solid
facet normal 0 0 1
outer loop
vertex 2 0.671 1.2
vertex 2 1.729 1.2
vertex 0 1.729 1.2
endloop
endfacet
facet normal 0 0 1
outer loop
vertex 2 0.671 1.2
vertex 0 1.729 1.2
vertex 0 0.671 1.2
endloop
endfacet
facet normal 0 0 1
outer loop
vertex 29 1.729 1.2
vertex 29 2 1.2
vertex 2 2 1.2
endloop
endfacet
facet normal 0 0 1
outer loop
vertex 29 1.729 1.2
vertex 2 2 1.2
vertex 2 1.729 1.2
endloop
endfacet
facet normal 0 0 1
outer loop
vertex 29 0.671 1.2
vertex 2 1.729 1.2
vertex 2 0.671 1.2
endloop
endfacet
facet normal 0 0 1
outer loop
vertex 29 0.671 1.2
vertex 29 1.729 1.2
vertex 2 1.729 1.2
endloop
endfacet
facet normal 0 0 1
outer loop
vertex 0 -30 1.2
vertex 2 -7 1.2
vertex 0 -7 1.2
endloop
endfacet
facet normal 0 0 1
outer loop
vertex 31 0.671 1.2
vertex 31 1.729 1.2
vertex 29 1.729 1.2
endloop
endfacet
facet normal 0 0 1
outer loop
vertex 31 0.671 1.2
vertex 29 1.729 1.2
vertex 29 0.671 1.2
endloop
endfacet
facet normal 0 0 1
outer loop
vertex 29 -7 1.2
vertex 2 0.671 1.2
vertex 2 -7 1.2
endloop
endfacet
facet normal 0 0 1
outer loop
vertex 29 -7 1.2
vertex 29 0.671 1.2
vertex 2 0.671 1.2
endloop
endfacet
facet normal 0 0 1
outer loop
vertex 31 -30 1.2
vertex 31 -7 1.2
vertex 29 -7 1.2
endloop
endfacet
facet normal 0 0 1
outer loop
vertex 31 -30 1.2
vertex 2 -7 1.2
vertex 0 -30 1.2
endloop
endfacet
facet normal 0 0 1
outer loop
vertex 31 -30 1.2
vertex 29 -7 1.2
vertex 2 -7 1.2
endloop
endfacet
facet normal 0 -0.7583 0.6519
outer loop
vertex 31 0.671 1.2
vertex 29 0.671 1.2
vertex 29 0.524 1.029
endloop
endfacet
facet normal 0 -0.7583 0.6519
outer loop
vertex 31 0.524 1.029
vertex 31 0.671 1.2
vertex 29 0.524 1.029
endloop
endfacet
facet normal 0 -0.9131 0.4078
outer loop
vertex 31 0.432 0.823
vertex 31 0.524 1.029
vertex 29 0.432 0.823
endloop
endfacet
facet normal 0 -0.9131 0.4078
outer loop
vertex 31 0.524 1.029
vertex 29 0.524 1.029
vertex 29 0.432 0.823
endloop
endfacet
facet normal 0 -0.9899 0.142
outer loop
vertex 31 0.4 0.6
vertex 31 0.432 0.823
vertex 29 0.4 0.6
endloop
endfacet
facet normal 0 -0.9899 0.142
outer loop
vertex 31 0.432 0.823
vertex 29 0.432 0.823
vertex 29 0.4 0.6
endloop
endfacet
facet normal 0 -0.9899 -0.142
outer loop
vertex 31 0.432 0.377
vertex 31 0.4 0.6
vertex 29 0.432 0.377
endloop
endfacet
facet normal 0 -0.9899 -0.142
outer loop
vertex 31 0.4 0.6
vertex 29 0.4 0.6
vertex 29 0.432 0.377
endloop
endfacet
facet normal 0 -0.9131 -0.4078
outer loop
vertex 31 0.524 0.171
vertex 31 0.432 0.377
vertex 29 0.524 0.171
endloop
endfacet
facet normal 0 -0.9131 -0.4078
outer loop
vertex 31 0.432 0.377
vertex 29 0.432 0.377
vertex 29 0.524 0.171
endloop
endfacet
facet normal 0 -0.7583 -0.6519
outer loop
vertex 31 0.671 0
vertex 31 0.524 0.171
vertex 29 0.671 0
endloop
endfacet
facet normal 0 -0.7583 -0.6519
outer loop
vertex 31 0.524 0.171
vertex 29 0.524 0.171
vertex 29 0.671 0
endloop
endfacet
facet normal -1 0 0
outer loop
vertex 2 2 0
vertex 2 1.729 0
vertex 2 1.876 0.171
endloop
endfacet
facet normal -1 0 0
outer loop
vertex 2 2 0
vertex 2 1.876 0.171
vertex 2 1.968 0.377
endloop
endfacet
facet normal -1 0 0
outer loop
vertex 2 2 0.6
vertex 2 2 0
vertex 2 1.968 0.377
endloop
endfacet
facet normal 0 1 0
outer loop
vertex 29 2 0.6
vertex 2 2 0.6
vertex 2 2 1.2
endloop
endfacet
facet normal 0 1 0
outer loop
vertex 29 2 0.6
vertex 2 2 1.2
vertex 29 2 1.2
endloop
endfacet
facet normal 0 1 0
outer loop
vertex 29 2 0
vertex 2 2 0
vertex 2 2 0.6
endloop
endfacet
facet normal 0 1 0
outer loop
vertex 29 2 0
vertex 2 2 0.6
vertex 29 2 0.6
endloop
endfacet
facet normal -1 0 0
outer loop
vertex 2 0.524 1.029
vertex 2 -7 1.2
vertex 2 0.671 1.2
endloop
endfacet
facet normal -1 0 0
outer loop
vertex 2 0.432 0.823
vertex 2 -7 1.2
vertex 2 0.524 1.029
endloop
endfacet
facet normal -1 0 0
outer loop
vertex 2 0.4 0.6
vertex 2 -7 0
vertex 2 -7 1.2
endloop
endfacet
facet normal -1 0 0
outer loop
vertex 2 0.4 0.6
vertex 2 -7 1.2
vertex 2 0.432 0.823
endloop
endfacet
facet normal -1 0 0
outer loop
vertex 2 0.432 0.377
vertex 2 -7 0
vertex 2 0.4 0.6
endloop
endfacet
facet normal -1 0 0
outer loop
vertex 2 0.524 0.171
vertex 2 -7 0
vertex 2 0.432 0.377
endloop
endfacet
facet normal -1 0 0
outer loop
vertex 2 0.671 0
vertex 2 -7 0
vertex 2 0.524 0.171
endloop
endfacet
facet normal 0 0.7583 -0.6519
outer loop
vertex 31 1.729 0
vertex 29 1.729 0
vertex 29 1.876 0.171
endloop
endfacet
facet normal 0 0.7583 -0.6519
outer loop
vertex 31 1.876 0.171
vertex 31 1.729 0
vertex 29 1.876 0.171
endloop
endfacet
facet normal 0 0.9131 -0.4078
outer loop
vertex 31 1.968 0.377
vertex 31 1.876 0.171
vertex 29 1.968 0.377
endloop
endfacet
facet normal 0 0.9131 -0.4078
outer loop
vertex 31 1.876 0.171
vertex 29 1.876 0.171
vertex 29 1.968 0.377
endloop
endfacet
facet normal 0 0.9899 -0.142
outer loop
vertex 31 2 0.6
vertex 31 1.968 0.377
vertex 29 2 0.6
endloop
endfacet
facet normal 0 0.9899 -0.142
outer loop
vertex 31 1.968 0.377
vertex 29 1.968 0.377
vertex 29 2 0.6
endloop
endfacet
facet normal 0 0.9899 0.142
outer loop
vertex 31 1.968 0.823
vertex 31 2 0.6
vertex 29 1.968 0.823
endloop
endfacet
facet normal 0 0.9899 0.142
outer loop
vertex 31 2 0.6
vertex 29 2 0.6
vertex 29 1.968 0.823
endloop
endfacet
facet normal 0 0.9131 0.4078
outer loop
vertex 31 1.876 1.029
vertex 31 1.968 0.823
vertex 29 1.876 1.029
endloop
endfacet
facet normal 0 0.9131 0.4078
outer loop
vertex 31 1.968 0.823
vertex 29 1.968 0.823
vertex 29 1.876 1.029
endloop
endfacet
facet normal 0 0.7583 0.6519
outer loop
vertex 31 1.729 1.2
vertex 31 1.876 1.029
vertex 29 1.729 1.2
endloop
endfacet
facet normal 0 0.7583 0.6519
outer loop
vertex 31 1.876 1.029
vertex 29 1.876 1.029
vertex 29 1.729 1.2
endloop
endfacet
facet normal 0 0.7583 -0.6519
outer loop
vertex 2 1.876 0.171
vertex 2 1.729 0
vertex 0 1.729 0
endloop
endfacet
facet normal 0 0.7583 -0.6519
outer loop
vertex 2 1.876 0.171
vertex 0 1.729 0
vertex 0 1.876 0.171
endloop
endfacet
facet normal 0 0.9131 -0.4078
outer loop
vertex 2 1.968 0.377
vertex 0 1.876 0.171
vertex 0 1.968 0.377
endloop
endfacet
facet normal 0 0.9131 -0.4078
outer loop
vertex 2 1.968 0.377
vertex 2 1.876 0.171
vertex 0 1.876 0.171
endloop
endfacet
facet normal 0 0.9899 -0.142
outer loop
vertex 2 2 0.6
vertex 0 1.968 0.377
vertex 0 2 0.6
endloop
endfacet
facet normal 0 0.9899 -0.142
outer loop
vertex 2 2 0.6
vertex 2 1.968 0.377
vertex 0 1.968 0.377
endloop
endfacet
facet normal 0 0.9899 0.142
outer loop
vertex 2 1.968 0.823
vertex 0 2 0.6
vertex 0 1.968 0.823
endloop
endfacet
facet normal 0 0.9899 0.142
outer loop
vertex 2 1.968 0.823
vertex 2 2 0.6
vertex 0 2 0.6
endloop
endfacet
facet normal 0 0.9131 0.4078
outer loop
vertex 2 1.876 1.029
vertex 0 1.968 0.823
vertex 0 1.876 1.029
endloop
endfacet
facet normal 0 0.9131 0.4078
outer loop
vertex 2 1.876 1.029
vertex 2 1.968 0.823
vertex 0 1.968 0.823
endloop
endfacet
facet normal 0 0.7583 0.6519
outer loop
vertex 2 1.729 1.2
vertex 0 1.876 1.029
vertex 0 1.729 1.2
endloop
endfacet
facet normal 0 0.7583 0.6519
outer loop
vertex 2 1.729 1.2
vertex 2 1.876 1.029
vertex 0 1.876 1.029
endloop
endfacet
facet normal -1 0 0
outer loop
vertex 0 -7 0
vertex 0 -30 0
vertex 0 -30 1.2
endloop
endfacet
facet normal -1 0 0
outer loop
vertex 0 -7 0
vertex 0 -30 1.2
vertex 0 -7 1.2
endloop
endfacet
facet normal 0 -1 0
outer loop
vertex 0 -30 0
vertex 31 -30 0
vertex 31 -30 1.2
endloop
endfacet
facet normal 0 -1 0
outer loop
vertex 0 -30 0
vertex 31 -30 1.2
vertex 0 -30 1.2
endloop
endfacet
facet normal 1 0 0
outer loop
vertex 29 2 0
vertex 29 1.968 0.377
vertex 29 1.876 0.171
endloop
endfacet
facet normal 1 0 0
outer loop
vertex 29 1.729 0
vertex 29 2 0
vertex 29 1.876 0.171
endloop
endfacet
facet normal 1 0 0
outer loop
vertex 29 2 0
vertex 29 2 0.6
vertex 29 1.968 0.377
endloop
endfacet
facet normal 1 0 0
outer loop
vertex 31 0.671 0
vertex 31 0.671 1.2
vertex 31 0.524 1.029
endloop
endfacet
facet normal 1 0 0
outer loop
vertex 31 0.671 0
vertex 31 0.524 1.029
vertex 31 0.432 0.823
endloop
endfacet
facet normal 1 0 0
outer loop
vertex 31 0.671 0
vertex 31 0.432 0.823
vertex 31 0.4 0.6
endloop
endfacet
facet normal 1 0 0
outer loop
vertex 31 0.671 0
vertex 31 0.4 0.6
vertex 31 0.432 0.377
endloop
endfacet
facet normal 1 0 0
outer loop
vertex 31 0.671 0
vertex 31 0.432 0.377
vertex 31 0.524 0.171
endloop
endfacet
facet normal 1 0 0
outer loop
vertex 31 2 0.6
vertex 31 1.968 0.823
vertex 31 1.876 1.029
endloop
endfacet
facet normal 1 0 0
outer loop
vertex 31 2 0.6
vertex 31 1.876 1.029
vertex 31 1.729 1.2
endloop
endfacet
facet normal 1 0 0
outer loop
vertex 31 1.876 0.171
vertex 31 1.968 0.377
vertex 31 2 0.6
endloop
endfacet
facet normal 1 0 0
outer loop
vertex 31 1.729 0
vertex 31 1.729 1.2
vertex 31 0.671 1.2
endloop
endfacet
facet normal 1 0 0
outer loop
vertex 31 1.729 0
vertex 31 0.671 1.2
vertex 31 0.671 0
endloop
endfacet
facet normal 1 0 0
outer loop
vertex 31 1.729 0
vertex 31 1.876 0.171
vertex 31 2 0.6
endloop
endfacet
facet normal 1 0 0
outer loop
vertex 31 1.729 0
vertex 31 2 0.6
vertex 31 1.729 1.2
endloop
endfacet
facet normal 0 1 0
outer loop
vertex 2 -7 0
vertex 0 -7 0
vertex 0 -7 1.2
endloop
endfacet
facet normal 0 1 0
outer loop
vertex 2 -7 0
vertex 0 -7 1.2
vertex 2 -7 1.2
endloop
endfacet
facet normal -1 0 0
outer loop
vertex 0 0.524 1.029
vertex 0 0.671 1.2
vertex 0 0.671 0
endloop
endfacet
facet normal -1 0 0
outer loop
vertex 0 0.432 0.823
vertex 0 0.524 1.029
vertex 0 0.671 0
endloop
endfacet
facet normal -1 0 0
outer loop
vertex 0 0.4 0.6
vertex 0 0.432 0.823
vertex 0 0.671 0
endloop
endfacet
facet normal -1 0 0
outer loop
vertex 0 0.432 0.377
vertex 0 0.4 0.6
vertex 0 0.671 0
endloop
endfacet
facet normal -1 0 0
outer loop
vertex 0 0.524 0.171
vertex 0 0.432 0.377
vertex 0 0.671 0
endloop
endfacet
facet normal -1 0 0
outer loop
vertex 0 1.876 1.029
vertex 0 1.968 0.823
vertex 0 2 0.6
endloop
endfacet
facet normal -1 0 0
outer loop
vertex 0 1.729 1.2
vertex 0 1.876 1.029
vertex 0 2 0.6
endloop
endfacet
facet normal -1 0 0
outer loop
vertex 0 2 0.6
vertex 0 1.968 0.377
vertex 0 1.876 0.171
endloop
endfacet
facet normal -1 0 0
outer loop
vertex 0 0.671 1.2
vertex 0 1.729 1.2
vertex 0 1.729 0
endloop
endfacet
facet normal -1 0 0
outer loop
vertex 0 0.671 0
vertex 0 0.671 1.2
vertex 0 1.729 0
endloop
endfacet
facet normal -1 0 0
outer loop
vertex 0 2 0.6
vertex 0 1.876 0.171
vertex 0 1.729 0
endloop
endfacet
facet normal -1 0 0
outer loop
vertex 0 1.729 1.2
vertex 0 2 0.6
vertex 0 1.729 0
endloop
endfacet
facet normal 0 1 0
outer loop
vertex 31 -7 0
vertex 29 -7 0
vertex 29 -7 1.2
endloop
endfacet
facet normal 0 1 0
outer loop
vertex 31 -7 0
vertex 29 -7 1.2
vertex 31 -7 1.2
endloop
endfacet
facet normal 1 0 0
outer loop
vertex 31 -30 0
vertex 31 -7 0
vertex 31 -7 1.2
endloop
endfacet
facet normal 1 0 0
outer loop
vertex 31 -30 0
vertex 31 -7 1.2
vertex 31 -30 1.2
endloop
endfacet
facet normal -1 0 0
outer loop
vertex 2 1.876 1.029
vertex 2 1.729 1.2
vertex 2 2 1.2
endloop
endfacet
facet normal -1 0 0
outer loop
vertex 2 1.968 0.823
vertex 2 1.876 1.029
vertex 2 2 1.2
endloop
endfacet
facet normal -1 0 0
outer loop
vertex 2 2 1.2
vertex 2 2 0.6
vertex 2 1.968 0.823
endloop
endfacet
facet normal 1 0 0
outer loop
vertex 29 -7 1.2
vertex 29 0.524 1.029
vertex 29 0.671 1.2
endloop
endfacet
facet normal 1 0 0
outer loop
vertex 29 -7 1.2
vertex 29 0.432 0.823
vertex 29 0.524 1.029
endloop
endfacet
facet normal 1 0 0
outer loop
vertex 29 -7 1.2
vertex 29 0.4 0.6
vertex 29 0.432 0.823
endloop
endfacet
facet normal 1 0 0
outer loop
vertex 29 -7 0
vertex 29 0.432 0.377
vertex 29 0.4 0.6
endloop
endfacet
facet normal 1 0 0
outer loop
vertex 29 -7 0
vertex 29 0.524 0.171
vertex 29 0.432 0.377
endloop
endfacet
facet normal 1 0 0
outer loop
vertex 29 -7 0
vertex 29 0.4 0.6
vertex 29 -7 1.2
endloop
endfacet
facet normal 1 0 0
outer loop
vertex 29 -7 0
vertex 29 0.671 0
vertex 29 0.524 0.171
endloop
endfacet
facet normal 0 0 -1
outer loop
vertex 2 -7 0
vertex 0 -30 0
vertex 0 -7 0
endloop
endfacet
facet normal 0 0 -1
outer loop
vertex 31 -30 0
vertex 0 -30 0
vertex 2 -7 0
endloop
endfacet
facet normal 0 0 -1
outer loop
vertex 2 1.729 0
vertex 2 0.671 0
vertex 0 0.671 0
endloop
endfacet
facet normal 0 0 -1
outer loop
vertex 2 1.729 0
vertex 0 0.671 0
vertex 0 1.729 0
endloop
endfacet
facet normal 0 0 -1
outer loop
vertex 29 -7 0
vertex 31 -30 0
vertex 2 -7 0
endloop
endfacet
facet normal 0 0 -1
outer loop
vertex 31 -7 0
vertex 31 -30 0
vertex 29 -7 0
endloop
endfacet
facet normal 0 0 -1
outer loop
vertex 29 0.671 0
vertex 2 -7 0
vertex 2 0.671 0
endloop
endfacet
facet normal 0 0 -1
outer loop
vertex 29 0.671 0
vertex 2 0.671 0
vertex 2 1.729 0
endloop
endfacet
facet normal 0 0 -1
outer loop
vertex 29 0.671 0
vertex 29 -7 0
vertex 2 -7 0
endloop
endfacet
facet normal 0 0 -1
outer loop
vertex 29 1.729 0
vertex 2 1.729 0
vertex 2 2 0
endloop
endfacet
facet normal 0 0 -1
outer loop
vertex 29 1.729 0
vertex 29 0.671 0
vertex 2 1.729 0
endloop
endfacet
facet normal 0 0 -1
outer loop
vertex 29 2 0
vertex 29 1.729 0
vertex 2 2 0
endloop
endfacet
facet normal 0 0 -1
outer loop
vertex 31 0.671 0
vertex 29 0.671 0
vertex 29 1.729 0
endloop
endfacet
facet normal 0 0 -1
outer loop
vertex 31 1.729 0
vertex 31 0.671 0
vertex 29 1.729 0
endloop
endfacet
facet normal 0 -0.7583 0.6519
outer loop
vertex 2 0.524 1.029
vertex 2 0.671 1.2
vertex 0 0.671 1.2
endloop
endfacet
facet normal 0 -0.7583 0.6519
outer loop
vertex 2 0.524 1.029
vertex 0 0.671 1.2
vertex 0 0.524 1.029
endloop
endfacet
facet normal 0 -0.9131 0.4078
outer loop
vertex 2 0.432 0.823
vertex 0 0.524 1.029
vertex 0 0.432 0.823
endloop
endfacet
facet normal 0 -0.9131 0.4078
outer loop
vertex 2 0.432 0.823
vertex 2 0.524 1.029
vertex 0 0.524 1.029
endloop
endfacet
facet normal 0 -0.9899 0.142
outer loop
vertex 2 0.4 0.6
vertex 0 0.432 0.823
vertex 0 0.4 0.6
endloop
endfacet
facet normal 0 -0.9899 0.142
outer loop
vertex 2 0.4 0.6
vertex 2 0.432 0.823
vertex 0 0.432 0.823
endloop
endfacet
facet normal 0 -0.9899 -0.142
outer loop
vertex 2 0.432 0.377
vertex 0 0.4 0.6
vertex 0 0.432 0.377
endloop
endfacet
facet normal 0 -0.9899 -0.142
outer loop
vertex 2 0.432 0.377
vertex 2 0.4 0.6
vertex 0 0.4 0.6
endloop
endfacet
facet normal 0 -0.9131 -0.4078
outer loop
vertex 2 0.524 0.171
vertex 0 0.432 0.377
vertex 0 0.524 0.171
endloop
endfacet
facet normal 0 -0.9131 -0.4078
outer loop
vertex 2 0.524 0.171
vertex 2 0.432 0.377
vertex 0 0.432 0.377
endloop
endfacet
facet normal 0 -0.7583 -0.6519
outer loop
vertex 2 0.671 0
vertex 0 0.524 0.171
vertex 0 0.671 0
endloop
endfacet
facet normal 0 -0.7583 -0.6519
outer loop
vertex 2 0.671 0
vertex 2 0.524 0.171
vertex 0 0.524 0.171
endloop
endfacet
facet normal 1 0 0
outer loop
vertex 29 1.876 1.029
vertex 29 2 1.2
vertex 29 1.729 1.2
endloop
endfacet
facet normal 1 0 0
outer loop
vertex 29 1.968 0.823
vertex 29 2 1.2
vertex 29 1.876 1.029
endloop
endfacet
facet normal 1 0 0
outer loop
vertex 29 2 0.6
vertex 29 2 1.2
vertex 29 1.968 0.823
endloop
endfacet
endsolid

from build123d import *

# Parameters (mm, degrees)
BOSS_EXTRUDE1_DEPTH = 1.2
BOSS_EXTRUDE3_DEPTH = 2


# Read off the part's stored shape, not the designer's step: Boss-Extrude3
with BuildPart() as part:
    # Sketch1 → Boss-Extrude1 (new body)
    with BuildSketch(Plane.XY):
        Polygon((2, 2), (29, 2), (29, -7), (31, -7), (31, -30), (0, -30), (0, -7), (2, -7), align=None)
    extrude(amount=BOSS_EXTRUDE1_DEPTH)

    # Boss-Extrude3 outline → Boss-Extrude3 (add)
    with BuildSketch(Plane(origin=(29, 0, 0), x_dir=(0, 0, -1), z_dir=(1, 0, 0))):
        with BuildLine():
            ThreePointArc((-1.2, 0.670849738), (-0.6, 0.4), (0, 0.670849738))
            Line((0, 0.670849738), (0, 1.729150262))
            ThreePointArc((0, 1.729150262), (-0.6, 2), (-1.2, 1.729150262))
            Line((-1.2, 1.729150262), (-1.2, 0.670849738))
        make_face()
    boss_extrude3 = extrude(amount=BOSS_EXTRUDE3_DEPTH)

    # Mirror1: Boss-Extrude3 across plane
    add(boss_extrude3.mirror(Plane.ZY.offset(-15.5)))


solid = part.part
